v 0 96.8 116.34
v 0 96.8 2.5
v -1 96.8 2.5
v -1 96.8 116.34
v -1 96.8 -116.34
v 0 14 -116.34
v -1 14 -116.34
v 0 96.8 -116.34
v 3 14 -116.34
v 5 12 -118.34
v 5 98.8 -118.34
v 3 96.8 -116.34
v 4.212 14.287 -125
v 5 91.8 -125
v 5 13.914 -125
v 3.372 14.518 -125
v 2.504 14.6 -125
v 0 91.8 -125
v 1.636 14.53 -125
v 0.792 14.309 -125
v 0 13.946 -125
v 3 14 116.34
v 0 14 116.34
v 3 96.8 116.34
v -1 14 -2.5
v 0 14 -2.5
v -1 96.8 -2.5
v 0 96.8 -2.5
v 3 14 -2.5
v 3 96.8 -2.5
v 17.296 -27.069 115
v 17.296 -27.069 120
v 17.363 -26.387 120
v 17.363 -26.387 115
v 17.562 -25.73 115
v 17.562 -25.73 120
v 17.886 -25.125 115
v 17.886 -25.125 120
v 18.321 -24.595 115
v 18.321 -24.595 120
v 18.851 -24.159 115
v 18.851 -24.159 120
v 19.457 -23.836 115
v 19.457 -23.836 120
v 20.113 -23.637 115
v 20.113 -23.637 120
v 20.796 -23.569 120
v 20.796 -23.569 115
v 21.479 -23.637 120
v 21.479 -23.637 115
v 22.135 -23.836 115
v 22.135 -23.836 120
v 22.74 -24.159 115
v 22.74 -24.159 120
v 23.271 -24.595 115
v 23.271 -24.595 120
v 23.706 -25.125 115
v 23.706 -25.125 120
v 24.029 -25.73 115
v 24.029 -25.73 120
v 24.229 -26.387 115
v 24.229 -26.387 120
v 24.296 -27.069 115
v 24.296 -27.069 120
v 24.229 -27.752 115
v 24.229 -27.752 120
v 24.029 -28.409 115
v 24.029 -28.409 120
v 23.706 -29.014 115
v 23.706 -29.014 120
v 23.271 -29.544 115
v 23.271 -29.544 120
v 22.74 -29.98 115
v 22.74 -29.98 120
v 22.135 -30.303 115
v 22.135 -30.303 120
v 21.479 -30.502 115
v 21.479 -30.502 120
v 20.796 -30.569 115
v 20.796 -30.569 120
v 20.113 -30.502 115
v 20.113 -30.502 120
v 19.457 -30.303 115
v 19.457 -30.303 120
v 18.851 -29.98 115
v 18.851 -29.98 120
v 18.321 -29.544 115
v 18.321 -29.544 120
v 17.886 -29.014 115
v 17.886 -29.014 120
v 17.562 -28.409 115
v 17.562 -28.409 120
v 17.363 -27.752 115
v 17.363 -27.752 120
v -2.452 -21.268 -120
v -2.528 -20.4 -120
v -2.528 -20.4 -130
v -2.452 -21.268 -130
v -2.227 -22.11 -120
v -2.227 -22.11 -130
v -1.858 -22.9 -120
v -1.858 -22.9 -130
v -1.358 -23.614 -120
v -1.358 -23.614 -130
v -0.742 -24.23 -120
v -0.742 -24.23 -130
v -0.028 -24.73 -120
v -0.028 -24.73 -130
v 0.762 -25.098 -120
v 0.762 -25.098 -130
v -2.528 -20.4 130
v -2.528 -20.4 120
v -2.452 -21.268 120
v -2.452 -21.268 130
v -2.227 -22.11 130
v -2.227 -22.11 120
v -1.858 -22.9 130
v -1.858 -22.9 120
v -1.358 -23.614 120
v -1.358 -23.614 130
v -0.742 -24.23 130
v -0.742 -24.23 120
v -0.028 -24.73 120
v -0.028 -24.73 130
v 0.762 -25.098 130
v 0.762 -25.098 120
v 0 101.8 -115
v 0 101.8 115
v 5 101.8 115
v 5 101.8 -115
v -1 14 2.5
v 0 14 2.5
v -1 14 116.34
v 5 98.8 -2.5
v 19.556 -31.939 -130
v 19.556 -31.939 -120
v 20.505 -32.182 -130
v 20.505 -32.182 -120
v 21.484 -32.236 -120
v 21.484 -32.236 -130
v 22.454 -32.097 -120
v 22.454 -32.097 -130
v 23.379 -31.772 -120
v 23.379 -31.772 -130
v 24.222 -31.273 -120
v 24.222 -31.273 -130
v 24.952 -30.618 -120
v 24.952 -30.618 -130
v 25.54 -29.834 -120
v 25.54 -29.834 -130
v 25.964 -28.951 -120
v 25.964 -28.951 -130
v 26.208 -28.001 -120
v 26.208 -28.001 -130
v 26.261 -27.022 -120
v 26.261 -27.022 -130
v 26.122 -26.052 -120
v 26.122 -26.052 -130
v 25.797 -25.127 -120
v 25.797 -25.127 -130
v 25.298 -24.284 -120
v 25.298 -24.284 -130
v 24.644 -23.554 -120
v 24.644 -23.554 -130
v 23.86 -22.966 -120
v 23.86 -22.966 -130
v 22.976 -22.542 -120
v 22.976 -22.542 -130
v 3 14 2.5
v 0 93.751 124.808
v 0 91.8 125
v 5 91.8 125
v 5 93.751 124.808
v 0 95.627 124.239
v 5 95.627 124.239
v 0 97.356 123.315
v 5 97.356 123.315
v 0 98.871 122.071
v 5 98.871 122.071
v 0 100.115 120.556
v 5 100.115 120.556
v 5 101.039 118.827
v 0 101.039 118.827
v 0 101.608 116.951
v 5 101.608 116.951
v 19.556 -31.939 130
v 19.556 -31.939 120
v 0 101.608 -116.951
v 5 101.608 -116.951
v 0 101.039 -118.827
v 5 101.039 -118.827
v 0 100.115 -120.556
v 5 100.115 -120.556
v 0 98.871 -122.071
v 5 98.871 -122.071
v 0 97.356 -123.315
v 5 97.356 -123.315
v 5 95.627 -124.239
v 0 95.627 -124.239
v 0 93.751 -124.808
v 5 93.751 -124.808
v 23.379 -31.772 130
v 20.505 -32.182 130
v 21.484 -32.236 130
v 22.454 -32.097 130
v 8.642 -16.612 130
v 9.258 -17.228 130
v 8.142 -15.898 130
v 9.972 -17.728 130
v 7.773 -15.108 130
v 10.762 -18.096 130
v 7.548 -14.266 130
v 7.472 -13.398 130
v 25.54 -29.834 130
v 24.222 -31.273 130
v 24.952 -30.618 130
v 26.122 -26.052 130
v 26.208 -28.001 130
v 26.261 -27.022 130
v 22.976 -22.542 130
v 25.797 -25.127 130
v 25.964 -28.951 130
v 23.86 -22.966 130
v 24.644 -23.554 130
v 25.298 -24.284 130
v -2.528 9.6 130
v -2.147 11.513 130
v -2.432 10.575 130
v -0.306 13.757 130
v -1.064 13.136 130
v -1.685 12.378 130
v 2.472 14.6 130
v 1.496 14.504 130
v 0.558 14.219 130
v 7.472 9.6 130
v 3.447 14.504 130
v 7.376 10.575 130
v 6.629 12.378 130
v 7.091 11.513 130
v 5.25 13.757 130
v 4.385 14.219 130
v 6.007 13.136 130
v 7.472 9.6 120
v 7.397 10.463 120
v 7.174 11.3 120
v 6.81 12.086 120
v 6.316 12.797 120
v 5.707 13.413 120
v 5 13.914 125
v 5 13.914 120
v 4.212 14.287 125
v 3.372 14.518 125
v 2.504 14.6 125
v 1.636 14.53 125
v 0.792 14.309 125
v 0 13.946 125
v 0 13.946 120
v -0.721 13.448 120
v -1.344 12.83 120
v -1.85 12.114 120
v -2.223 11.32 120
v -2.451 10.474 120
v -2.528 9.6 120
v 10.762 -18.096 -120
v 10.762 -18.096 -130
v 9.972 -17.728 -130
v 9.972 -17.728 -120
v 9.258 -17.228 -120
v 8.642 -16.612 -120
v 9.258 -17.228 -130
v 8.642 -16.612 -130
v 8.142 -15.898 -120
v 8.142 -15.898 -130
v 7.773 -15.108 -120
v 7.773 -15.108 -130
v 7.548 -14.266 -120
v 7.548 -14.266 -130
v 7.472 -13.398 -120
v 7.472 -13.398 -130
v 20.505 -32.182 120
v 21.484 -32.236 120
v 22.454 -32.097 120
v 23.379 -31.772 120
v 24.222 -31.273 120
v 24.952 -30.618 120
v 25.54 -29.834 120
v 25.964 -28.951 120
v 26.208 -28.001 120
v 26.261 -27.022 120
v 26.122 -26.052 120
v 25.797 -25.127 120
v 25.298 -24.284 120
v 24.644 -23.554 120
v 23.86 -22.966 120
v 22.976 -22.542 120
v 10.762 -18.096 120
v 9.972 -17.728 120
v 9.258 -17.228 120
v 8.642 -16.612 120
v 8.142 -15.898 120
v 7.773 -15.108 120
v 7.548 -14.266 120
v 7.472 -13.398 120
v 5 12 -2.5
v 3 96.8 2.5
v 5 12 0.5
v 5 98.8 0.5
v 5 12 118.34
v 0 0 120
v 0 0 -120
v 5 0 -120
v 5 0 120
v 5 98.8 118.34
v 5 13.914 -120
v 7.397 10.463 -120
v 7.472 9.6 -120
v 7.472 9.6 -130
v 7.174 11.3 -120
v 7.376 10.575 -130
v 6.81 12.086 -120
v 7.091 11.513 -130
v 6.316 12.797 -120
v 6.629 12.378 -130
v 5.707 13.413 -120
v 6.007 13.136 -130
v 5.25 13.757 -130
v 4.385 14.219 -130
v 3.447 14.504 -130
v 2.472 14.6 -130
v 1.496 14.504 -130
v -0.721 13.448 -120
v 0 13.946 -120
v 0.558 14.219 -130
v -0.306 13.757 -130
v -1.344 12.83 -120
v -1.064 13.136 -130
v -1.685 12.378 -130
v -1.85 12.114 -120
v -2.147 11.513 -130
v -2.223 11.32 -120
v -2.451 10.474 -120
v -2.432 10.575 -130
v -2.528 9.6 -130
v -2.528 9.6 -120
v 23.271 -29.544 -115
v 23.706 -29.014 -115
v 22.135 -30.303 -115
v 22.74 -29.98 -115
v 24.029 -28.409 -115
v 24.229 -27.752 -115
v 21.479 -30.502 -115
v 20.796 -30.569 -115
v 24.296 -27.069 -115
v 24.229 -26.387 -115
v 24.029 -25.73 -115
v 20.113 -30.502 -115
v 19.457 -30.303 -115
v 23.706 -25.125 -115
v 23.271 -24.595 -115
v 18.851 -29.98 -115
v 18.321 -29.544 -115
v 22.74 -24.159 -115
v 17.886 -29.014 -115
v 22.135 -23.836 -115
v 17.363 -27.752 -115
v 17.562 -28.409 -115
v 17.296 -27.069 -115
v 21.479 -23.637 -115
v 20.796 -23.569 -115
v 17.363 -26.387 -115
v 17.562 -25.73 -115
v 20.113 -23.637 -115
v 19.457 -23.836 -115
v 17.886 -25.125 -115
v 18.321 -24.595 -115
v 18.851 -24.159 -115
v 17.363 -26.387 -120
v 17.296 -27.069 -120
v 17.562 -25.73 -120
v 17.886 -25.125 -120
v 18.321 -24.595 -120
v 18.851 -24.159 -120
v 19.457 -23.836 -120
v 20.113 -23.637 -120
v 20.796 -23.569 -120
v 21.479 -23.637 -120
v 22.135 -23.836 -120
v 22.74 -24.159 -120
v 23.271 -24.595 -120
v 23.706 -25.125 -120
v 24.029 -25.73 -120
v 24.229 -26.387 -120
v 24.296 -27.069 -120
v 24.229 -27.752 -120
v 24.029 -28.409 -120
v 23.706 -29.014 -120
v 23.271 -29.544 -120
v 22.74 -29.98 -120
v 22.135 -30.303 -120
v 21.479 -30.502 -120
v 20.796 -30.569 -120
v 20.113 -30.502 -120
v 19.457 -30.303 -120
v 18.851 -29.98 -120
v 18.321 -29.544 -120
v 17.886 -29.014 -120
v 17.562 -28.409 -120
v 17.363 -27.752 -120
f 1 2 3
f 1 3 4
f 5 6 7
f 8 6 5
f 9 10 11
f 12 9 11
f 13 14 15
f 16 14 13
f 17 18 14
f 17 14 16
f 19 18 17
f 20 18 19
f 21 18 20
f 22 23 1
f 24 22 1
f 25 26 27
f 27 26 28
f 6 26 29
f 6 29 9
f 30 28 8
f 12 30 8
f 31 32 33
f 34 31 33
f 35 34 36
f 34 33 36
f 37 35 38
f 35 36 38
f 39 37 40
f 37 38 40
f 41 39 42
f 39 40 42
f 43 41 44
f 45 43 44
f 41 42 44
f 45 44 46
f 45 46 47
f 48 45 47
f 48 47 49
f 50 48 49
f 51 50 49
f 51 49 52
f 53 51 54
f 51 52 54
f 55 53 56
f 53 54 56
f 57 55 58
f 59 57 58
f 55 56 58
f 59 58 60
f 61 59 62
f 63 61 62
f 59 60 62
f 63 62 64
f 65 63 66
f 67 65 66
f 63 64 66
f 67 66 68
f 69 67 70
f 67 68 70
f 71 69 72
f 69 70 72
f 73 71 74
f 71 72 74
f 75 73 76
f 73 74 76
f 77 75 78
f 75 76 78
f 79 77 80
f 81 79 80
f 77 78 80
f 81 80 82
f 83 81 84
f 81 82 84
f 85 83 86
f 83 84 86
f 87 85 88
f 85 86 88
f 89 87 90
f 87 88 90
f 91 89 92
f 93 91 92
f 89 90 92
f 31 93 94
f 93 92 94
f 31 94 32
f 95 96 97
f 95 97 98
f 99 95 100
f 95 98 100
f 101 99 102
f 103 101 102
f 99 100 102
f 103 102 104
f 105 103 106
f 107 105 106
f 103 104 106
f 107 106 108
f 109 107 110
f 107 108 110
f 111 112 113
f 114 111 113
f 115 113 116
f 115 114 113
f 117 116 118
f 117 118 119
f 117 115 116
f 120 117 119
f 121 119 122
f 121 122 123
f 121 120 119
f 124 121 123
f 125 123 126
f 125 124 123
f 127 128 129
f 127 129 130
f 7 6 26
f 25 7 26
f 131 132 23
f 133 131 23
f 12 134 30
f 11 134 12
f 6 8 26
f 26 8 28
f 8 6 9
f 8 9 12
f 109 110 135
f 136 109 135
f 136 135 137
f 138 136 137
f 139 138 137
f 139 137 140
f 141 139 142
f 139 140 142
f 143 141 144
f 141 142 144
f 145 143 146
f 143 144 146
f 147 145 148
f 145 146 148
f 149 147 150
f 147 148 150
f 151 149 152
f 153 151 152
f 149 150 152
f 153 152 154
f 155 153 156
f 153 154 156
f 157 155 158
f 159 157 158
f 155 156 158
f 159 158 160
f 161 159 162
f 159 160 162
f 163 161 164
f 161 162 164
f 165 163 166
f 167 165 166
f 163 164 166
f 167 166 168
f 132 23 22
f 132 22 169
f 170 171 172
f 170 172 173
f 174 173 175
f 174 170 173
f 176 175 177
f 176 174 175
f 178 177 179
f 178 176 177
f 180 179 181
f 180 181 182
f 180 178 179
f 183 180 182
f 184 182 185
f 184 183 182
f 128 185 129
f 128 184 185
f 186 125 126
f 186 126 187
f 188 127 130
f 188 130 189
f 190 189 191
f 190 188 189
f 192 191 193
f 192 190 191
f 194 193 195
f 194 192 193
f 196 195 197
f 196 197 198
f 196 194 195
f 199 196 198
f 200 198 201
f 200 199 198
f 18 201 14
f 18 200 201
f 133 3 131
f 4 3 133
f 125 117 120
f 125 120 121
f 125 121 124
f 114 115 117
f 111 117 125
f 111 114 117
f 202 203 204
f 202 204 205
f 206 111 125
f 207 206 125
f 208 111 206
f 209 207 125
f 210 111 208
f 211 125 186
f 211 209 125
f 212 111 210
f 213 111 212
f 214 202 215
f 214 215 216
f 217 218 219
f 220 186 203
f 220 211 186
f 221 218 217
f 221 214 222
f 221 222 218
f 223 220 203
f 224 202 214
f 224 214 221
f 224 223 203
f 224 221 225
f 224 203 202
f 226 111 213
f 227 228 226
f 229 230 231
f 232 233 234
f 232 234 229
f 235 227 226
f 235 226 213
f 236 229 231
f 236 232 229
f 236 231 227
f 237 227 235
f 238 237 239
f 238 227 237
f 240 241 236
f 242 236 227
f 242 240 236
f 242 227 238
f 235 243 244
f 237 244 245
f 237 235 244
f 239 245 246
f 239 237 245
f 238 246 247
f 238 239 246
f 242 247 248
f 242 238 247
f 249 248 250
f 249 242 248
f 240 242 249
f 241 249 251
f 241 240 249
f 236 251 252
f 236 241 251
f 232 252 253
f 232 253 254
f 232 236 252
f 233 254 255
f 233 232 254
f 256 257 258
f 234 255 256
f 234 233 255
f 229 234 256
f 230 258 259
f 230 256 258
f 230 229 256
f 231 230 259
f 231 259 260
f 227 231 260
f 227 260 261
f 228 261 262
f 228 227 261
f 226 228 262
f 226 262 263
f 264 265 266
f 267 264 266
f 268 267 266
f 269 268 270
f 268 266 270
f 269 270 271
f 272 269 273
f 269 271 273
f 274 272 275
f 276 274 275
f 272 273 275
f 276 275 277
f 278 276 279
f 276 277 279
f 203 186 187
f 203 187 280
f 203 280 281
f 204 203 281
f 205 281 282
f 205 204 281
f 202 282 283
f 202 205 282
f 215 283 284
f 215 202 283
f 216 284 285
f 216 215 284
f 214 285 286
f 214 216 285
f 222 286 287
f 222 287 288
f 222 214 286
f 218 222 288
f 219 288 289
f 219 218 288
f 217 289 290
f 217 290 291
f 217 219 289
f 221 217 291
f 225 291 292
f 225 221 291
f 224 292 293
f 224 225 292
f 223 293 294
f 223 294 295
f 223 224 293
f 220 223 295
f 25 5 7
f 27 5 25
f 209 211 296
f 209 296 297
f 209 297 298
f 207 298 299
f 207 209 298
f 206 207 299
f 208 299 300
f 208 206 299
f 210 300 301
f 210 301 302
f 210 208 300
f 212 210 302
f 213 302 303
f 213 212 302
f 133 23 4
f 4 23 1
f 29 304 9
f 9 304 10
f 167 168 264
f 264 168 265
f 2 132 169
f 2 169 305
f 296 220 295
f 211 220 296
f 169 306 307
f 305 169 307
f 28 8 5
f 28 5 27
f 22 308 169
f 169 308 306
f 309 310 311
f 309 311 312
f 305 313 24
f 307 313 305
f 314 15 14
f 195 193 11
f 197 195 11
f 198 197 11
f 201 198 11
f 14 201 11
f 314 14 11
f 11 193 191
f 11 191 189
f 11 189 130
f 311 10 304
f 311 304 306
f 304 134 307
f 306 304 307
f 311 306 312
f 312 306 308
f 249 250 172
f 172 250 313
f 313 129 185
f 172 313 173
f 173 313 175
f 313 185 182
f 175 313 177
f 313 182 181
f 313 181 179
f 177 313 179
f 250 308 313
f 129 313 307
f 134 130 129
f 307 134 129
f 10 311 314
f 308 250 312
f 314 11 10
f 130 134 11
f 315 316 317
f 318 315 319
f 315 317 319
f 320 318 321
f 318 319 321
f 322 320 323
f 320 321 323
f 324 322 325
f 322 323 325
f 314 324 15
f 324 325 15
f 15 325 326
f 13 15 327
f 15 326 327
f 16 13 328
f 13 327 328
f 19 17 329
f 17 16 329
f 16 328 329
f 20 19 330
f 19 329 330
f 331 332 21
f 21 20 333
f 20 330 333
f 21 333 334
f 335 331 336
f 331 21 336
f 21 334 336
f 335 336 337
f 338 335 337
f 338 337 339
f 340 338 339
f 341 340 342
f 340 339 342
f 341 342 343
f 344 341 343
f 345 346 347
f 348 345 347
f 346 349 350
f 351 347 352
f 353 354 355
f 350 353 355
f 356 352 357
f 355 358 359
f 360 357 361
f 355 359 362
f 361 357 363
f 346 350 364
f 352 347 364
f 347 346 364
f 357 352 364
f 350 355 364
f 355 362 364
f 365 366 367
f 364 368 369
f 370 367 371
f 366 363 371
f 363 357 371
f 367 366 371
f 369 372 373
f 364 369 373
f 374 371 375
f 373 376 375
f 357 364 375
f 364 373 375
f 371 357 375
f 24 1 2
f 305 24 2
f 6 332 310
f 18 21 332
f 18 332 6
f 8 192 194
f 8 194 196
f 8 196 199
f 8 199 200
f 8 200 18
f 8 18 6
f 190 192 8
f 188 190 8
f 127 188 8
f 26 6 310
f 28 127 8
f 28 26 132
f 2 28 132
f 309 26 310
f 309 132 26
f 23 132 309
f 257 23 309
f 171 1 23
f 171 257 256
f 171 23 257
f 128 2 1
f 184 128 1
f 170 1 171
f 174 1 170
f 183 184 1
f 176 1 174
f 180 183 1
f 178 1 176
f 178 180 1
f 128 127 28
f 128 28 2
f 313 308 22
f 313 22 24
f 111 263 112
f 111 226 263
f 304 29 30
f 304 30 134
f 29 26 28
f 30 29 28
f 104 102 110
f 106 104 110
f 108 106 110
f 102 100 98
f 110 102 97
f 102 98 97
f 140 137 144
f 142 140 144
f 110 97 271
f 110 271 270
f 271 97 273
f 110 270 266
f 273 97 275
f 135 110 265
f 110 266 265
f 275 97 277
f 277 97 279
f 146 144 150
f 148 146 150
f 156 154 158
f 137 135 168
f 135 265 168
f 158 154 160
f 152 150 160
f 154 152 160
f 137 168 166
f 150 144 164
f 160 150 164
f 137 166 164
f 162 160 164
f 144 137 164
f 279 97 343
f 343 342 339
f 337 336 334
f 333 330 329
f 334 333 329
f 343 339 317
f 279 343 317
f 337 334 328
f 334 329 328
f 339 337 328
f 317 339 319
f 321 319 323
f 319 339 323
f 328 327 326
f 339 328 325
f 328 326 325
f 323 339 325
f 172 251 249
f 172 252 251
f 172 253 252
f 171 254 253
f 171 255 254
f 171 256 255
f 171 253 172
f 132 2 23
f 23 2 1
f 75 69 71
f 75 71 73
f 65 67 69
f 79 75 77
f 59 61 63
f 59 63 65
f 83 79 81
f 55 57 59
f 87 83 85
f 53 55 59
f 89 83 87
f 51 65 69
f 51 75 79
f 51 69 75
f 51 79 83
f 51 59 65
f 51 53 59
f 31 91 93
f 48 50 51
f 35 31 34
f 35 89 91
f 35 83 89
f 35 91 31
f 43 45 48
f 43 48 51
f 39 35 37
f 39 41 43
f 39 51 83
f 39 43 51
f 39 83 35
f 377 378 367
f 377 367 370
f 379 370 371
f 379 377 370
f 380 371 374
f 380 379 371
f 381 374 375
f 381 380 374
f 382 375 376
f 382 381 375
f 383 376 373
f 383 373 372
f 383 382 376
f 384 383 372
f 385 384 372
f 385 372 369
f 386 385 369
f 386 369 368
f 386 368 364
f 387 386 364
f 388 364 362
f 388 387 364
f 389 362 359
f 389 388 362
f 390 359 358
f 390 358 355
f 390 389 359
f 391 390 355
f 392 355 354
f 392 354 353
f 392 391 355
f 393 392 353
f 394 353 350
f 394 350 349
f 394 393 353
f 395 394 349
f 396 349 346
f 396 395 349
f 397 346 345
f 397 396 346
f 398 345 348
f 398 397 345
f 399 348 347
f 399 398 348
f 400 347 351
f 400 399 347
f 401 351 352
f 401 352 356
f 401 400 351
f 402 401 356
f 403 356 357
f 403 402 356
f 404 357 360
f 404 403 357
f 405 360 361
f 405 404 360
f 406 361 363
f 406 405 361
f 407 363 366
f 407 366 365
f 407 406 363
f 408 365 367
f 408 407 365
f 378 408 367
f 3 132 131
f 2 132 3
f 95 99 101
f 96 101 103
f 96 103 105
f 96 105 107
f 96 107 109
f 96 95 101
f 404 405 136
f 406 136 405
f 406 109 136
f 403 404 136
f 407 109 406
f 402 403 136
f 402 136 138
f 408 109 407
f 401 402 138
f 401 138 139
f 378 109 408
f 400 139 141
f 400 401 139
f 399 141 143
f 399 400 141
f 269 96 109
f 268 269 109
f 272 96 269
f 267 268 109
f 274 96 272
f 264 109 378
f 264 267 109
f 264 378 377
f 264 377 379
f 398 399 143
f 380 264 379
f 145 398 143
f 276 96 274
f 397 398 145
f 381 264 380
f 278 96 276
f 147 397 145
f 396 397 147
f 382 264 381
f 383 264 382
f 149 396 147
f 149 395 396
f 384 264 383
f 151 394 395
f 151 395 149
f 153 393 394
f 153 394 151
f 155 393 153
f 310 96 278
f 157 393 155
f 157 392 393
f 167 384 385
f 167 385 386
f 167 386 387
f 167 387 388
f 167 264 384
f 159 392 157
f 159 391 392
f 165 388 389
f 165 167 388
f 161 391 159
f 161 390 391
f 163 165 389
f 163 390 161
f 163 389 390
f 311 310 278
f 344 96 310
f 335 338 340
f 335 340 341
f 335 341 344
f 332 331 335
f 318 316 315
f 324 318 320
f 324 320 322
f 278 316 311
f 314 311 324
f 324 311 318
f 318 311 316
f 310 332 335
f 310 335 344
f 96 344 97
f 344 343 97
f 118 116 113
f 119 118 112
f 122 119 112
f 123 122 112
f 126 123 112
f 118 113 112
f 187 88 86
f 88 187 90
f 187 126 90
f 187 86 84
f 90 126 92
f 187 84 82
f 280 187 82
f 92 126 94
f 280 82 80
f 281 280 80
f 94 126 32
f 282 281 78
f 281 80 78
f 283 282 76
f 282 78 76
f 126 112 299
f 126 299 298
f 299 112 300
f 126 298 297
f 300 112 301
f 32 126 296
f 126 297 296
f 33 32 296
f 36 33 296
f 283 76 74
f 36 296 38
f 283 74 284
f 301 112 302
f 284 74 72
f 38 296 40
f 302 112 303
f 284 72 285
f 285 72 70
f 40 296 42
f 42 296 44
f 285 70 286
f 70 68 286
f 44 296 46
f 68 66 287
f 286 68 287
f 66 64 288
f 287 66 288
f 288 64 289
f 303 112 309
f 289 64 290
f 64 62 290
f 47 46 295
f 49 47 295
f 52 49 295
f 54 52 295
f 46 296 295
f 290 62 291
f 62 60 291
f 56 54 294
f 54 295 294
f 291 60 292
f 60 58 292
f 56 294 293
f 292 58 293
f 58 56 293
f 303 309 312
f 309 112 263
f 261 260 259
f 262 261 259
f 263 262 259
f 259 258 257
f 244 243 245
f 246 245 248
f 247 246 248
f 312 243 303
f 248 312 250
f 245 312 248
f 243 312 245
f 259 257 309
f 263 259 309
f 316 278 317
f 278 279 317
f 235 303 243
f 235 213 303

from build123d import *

# Parameters (mm, degrees)
SKETCH1_W             = 113.839745962
SKETCH1_H             = 82.8
BOSS_EXTRUDE1_DEPTH   = 5
CHAMFER1_SIZE         = 2
BOSS_EXTRUDE2_DEPTH   = 250
BOSS_EXTRUDE5_DEPTH   = 5
SKETCH4_R             = 3.5
BOSS_EXTRUDE6_DEPTH   = 5
SKETCH8_W             = 113.839745962
SKETCH8_H             = 82.8
BOSS_EXTRUDE8_DEPTH   = 1
BOSS_EXTRUDE8_2_DEPTH = 1


with BuildPart() as part:
    # Sketch1 → Boss-Extrude1 (new body)
    with BuildSketch(Plane(origin=(0, 0, 0), x_dir=(0, 0, -1), z_dir=(1, 0, 0))):
        with BuildLine():
            Line((-115, 101.8), (115, 101.8))
            ThreePointArc((115, 101.8), (122.071067812, 98.871067812), (125, 91.8))
            Line((125, 91.8), (125, 0))
            Line((125, 0), (-125, 0))
            Line((-125, 0), (-125, 91.8))
            ThreePointArc((-125, 91.8), (-122.071067812, 98.871067812), (-115, 101.8))
        make_face()
        with Locations((59.419872981, 55.4)):
            Rectangle(SKETCH1_W, SKETCH1_H, mode=Mode.SUBTRACT)
        with Locations((-59.419872981, 55.4)):
            Rectangle(SKETCH1_W, SKETCH1_H, mode=Mode.SUBTRACT)
    extrude(amount=BOSS_EXTRUDE1_DEPTH)

    # Chamfer1
    chamfer1_edges = [part.edges().sort_by_distance(p)[0] for p in [
        (5, 55.4, 116.339745962),
        (5, 14, 59.419872981),
        (5, 55.4, 2.5),
        (5, 96.8, 59.419872981),
        (5, 55.4, -116.339745962),
        (5, 96.8, -59.419872981),
        (5, 14, -59.419872981),
    ]]
    chamfer(chamfer1_edges, length=CHAMFER1_SIZE)

    # Sketch2 → Boss-Extrude2 (add, through all)
    with BuildSketch(Plane.XY.offset(125)):
        Polygon((0, 0), (5, 0), (0, 0.881634904), align=None)
    extrude(amount=-BOSS_EXTRUDE2_DEPTH)

    # Sketch3 → Boss-Extrude5 (add, symmetric)
    with BuildSketch(Plane.XY.offset(125)):
        with BuildLine():
            Line((-2.528093442, 9.6), (-2.528093442, -20.4))
            ThreePointArc((-2.528093442, -20.4), (-1.623853664, -23.267882182), (0.761805841, -25.098463104))
            Line((0.761805841, -25.098463104), (19.555658257, -31.93886597))
            ThreePointArc((19.555658257, -31.93886597), (25.964222077, -28.950503583), (22.97585969, -22.541939763))
            Line((22.97585969, -22.541939763), (10.761805841, -18.096387722))
            ThreePointArc((10.761805841, -18.096387722), (8.376146336, -16.2658068), (7.471906558, -13.397924618))
            Line((7.471906558, -13.397924618), (7.471906558, 9.6))
            ThreePointArc((7.471906558, 9.6), (2.471906558, 14.6), (-2.528093442, 9.6))
        make_face()
    boss_extrude5 = extrude(amount=BOSS_EXTRUDE5_DEPTH, both=True)

    # Sketch4 → Boss-Extrude6 (add)
    with BuildSketch(Plane(origin=(0, 0, 120), x_dir=(-1, 0, 0), z_dir=(0, 0, -1))):
        with Locations((-20.795912663, -27.069392795)):
            Circle(SKETCH4_R)
    boss_extrude6 = extrude(amount=BOSS_EXTRUDE6_DEPTH)

    # Mirror13: Boss-Extrude5, Boss-Extrude6 across plane
    add(boss_extrude5.mirror(Plane.XY))
    add(boss_extrude6.mirror(Plane.XY))


with BuildPart() as body_2:
    # Sketch8 → Boss-Extrude8 (new body)
    with BuildSketch(Plane.ZY):
        with Locations((59.419872981, 55.4)):
            Rectangle(SKETCH8_W, SKETCH8_H)
    extrude(amount=BOSS_EXTRUDE8_DEPTH)


with BuildPart() as body_3:
    # Sketch8 → Boss-Extrude8 2 (new body)
    with BuildSketch(Plane.ZY):
        with Locations((-59.419872981, 55.4)):
            Rectangle(SKETCH8_W, SKETCH8_H)
    extrude(amount=BOSS_EXTRUDE8_2_DEPTH)


solid = Compound([part.part, body_2.part, body_3.part])
